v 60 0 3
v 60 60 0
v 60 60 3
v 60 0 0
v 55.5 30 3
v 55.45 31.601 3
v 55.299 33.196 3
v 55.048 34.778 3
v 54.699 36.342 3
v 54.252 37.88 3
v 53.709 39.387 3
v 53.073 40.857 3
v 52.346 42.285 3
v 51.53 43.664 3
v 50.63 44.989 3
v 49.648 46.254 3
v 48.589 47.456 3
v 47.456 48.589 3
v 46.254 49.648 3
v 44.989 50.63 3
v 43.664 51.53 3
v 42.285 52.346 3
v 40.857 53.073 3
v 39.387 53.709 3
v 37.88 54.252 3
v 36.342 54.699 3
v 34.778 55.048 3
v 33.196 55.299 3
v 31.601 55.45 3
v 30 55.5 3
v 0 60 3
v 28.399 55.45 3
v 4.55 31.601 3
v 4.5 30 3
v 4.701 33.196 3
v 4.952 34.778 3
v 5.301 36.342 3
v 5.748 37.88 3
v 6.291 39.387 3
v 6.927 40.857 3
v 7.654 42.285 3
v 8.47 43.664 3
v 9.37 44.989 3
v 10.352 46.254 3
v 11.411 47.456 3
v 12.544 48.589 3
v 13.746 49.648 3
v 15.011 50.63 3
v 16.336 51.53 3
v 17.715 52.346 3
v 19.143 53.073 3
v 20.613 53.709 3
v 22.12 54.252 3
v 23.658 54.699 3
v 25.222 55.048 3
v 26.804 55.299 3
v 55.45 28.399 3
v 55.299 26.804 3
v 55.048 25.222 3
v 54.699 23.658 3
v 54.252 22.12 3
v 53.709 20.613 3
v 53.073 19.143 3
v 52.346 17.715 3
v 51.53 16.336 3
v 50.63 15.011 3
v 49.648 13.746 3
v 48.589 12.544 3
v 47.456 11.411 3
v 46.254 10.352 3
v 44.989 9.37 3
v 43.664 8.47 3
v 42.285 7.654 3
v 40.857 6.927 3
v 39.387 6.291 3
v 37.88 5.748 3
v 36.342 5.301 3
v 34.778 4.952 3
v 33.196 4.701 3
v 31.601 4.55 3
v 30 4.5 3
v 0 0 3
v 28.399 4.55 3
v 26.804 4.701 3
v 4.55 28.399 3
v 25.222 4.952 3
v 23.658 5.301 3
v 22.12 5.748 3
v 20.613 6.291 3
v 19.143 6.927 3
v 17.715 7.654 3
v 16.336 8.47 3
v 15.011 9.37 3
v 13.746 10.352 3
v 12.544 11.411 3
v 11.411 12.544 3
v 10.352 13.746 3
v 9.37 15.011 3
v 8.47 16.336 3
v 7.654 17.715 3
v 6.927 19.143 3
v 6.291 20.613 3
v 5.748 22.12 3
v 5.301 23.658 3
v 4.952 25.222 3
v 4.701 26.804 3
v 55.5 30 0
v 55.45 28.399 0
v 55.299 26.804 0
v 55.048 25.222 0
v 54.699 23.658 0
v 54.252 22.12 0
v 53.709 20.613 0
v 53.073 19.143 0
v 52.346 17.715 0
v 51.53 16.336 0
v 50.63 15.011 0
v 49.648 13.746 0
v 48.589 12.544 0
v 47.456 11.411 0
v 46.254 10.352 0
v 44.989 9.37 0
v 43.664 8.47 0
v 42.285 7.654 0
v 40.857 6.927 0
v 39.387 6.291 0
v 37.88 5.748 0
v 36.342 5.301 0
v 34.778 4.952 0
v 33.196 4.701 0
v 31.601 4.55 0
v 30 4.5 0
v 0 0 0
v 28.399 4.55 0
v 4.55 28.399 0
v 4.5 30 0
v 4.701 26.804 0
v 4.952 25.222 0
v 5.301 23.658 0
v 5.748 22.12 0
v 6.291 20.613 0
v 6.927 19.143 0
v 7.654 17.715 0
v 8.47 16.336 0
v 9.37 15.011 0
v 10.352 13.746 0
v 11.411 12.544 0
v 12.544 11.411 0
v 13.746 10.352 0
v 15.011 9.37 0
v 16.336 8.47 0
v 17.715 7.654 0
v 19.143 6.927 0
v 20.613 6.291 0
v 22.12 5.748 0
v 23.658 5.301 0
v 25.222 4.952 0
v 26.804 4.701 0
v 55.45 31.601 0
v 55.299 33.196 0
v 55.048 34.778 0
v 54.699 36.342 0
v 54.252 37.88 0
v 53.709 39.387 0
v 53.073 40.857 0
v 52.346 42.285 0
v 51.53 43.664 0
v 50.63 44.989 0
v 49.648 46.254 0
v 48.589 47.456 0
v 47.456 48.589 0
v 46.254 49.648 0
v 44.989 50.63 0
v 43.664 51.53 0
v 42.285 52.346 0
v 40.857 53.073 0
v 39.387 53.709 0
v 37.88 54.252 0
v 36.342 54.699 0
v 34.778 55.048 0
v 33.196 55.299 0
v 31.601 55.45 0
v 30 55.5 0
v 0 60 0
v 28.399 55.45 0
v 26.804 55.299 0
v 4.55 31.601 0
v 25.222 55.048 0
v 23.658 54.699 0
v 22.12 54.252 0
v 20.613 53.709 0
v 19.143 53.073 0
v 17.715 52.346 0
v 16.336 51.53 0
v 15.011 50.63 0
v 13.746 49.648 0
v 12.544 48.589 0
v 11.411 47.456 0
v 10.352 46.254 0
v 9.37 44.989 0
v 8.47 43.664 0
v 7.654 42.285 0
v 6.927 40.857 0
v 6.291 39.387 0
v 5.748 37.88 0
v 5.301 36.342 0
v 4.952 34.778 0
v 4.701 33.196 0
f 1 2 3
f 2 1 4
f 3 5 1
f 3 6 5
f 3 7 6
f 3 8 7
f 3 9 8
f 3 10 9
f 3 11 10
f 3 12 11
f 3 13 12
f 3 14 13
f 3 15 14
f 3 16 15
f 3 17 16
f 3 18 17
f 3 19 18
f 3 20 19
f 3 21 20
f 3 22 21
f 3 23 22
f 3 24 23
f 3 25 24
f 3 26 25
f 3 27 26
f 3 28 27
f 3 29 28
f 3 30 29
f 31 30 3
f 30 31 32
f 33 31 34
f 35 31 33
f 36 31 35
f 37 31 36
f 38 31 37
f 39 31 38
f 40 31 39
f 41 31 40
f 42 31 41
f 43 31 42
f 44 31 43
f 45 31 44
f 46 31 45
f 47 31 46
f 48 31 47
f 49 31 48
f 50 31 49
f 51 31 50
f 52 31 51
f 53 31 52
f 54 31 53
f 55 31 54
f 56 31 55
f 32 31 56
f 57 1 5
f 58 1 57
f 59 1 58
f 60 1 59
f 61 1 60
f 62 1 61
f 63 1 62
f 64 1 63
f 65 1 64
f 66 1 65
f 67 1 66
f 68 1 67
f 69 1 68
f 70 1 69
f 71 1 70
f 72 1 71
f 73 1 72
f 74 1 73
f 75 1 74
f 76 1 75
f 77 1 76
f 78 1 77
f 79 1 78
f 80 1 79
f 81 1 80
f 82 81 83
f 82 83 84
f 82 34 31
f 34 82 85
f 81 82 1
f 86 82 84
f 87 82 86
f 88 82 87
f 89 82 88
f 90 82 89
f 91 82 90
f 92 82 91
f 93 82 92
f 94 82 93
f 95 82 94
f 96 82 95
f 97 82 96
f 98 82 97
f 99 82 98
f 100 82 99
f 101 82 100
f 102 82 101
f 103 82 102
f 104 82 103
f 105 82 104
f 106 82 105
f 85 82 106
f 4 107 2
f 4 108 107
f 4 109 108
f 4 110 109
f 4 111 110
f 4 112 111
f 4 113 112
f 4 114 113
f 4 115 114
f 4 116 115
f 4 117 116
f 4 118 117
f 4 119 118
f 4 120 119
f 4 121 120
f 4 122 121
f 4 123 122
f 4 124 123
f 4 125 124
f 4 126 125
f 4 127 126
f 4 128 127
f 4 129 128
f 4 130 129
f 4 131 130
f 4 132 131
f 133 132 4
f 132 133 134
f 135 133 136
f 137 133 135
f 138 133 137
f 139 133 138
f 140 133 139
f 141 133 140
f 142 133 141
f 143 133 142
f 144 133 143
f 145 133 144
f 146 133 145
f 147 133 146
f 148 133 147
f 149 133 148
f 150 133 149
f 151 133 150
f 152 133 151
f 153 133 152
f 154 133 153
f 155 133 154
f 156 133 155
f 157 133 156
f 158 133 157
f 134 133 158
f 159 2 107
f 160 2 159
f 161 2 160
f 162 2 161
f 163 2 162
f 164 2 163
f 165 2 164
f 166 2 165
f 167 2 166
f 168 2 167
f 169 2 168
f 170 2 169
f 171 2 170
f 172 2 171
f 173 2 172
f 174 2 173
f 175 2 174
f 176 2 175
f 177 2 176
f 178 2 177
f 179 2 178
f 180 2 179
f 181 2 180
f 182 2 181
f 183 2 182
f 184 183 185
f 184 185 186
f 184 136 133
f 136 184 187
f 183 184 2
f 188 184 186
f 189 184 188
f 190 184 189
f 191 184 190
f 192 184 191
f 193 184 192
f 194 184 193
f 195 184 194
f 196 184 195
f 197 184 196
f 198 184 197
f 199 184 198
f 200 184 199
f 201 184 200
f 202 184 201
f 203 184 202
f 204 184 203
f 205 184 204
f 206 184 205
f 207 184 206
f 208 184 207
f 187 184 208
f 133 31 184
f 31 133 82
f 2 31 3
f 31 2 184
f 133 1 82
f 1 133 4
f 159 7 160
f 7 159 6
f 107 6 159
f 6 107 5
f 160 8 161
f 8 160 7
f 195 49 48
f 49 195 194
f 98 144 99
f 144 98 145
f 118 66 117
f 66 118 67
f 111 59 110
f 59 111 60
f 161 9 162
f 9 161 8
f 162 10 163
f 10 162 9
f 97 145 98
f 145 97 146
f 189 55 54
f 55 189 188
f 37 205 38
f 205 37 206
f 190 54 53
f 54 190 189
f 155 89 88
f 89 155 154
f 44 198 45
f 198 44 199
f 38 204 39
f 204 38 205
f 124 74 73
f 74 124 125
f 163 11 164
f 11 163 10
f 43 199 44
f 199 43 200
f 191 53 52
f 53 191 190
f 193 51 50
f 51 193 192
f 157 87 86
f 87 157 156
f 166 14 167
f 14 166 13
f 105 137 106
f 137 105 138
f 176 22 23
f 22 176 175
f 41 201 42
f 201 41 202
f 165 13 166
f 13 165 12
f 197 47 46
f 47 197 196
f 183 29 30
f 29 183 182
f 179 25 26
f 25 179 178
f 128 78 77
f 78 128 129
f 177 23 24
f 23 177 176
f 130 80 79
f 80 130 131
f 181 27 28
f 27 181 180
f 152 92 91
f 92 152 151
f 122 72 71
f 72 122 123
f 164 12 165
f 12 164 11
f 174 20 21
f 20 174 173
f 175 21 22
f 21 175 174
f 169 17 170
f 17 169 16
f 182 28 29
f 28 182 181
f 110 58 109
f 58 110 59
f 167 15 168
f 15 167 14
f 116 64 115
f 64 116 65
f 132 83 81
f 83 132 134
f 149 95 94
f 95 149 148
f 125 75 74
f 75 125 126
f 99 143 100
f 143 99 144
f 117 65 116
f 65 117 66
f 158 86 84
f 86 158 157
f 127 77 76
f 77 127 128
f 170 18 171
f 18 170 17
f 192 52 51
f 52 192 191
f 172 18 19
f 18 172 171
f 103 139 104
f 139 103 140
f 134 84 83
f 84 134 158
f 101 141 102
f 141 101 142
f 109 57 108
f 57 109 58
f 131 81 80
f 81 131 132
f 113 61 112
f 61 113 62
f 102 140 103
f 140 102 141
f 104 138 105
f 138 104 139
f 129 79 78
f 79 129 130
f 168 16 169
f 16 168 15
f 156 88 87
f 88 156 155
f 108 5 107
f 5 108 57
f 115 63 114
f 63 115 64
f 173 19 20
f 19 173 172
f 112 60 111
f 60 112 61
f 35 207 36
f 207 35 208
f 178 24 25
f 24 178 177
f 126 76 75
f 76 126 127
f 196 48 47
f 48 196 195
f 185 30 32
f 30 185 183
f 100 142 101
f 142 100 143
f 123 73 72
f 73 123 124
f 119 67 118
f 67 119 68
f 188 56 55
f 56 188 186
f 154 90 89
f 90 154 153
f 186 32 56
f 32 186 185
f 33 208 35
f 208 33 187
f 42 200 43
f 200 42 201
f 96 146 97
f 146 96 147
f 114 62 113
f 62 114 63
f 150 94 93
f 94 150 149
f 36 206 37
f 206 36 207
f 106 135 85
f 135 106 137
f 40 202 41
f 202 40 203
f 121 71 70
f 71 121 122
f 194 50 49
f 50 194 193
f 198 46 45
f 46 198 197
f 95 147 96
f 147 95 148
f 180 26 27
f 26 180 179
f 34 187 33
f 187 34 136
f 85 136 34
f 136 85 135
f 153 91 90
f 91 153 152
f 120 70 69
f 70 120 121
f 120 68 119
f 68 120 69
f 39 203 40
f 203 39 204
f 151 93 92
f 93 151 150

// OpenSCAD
$fn=100;

difference(){
cube([60,60,3]);
    translate([30,30,0])
cylinder(r=25.5,h=4);
}
